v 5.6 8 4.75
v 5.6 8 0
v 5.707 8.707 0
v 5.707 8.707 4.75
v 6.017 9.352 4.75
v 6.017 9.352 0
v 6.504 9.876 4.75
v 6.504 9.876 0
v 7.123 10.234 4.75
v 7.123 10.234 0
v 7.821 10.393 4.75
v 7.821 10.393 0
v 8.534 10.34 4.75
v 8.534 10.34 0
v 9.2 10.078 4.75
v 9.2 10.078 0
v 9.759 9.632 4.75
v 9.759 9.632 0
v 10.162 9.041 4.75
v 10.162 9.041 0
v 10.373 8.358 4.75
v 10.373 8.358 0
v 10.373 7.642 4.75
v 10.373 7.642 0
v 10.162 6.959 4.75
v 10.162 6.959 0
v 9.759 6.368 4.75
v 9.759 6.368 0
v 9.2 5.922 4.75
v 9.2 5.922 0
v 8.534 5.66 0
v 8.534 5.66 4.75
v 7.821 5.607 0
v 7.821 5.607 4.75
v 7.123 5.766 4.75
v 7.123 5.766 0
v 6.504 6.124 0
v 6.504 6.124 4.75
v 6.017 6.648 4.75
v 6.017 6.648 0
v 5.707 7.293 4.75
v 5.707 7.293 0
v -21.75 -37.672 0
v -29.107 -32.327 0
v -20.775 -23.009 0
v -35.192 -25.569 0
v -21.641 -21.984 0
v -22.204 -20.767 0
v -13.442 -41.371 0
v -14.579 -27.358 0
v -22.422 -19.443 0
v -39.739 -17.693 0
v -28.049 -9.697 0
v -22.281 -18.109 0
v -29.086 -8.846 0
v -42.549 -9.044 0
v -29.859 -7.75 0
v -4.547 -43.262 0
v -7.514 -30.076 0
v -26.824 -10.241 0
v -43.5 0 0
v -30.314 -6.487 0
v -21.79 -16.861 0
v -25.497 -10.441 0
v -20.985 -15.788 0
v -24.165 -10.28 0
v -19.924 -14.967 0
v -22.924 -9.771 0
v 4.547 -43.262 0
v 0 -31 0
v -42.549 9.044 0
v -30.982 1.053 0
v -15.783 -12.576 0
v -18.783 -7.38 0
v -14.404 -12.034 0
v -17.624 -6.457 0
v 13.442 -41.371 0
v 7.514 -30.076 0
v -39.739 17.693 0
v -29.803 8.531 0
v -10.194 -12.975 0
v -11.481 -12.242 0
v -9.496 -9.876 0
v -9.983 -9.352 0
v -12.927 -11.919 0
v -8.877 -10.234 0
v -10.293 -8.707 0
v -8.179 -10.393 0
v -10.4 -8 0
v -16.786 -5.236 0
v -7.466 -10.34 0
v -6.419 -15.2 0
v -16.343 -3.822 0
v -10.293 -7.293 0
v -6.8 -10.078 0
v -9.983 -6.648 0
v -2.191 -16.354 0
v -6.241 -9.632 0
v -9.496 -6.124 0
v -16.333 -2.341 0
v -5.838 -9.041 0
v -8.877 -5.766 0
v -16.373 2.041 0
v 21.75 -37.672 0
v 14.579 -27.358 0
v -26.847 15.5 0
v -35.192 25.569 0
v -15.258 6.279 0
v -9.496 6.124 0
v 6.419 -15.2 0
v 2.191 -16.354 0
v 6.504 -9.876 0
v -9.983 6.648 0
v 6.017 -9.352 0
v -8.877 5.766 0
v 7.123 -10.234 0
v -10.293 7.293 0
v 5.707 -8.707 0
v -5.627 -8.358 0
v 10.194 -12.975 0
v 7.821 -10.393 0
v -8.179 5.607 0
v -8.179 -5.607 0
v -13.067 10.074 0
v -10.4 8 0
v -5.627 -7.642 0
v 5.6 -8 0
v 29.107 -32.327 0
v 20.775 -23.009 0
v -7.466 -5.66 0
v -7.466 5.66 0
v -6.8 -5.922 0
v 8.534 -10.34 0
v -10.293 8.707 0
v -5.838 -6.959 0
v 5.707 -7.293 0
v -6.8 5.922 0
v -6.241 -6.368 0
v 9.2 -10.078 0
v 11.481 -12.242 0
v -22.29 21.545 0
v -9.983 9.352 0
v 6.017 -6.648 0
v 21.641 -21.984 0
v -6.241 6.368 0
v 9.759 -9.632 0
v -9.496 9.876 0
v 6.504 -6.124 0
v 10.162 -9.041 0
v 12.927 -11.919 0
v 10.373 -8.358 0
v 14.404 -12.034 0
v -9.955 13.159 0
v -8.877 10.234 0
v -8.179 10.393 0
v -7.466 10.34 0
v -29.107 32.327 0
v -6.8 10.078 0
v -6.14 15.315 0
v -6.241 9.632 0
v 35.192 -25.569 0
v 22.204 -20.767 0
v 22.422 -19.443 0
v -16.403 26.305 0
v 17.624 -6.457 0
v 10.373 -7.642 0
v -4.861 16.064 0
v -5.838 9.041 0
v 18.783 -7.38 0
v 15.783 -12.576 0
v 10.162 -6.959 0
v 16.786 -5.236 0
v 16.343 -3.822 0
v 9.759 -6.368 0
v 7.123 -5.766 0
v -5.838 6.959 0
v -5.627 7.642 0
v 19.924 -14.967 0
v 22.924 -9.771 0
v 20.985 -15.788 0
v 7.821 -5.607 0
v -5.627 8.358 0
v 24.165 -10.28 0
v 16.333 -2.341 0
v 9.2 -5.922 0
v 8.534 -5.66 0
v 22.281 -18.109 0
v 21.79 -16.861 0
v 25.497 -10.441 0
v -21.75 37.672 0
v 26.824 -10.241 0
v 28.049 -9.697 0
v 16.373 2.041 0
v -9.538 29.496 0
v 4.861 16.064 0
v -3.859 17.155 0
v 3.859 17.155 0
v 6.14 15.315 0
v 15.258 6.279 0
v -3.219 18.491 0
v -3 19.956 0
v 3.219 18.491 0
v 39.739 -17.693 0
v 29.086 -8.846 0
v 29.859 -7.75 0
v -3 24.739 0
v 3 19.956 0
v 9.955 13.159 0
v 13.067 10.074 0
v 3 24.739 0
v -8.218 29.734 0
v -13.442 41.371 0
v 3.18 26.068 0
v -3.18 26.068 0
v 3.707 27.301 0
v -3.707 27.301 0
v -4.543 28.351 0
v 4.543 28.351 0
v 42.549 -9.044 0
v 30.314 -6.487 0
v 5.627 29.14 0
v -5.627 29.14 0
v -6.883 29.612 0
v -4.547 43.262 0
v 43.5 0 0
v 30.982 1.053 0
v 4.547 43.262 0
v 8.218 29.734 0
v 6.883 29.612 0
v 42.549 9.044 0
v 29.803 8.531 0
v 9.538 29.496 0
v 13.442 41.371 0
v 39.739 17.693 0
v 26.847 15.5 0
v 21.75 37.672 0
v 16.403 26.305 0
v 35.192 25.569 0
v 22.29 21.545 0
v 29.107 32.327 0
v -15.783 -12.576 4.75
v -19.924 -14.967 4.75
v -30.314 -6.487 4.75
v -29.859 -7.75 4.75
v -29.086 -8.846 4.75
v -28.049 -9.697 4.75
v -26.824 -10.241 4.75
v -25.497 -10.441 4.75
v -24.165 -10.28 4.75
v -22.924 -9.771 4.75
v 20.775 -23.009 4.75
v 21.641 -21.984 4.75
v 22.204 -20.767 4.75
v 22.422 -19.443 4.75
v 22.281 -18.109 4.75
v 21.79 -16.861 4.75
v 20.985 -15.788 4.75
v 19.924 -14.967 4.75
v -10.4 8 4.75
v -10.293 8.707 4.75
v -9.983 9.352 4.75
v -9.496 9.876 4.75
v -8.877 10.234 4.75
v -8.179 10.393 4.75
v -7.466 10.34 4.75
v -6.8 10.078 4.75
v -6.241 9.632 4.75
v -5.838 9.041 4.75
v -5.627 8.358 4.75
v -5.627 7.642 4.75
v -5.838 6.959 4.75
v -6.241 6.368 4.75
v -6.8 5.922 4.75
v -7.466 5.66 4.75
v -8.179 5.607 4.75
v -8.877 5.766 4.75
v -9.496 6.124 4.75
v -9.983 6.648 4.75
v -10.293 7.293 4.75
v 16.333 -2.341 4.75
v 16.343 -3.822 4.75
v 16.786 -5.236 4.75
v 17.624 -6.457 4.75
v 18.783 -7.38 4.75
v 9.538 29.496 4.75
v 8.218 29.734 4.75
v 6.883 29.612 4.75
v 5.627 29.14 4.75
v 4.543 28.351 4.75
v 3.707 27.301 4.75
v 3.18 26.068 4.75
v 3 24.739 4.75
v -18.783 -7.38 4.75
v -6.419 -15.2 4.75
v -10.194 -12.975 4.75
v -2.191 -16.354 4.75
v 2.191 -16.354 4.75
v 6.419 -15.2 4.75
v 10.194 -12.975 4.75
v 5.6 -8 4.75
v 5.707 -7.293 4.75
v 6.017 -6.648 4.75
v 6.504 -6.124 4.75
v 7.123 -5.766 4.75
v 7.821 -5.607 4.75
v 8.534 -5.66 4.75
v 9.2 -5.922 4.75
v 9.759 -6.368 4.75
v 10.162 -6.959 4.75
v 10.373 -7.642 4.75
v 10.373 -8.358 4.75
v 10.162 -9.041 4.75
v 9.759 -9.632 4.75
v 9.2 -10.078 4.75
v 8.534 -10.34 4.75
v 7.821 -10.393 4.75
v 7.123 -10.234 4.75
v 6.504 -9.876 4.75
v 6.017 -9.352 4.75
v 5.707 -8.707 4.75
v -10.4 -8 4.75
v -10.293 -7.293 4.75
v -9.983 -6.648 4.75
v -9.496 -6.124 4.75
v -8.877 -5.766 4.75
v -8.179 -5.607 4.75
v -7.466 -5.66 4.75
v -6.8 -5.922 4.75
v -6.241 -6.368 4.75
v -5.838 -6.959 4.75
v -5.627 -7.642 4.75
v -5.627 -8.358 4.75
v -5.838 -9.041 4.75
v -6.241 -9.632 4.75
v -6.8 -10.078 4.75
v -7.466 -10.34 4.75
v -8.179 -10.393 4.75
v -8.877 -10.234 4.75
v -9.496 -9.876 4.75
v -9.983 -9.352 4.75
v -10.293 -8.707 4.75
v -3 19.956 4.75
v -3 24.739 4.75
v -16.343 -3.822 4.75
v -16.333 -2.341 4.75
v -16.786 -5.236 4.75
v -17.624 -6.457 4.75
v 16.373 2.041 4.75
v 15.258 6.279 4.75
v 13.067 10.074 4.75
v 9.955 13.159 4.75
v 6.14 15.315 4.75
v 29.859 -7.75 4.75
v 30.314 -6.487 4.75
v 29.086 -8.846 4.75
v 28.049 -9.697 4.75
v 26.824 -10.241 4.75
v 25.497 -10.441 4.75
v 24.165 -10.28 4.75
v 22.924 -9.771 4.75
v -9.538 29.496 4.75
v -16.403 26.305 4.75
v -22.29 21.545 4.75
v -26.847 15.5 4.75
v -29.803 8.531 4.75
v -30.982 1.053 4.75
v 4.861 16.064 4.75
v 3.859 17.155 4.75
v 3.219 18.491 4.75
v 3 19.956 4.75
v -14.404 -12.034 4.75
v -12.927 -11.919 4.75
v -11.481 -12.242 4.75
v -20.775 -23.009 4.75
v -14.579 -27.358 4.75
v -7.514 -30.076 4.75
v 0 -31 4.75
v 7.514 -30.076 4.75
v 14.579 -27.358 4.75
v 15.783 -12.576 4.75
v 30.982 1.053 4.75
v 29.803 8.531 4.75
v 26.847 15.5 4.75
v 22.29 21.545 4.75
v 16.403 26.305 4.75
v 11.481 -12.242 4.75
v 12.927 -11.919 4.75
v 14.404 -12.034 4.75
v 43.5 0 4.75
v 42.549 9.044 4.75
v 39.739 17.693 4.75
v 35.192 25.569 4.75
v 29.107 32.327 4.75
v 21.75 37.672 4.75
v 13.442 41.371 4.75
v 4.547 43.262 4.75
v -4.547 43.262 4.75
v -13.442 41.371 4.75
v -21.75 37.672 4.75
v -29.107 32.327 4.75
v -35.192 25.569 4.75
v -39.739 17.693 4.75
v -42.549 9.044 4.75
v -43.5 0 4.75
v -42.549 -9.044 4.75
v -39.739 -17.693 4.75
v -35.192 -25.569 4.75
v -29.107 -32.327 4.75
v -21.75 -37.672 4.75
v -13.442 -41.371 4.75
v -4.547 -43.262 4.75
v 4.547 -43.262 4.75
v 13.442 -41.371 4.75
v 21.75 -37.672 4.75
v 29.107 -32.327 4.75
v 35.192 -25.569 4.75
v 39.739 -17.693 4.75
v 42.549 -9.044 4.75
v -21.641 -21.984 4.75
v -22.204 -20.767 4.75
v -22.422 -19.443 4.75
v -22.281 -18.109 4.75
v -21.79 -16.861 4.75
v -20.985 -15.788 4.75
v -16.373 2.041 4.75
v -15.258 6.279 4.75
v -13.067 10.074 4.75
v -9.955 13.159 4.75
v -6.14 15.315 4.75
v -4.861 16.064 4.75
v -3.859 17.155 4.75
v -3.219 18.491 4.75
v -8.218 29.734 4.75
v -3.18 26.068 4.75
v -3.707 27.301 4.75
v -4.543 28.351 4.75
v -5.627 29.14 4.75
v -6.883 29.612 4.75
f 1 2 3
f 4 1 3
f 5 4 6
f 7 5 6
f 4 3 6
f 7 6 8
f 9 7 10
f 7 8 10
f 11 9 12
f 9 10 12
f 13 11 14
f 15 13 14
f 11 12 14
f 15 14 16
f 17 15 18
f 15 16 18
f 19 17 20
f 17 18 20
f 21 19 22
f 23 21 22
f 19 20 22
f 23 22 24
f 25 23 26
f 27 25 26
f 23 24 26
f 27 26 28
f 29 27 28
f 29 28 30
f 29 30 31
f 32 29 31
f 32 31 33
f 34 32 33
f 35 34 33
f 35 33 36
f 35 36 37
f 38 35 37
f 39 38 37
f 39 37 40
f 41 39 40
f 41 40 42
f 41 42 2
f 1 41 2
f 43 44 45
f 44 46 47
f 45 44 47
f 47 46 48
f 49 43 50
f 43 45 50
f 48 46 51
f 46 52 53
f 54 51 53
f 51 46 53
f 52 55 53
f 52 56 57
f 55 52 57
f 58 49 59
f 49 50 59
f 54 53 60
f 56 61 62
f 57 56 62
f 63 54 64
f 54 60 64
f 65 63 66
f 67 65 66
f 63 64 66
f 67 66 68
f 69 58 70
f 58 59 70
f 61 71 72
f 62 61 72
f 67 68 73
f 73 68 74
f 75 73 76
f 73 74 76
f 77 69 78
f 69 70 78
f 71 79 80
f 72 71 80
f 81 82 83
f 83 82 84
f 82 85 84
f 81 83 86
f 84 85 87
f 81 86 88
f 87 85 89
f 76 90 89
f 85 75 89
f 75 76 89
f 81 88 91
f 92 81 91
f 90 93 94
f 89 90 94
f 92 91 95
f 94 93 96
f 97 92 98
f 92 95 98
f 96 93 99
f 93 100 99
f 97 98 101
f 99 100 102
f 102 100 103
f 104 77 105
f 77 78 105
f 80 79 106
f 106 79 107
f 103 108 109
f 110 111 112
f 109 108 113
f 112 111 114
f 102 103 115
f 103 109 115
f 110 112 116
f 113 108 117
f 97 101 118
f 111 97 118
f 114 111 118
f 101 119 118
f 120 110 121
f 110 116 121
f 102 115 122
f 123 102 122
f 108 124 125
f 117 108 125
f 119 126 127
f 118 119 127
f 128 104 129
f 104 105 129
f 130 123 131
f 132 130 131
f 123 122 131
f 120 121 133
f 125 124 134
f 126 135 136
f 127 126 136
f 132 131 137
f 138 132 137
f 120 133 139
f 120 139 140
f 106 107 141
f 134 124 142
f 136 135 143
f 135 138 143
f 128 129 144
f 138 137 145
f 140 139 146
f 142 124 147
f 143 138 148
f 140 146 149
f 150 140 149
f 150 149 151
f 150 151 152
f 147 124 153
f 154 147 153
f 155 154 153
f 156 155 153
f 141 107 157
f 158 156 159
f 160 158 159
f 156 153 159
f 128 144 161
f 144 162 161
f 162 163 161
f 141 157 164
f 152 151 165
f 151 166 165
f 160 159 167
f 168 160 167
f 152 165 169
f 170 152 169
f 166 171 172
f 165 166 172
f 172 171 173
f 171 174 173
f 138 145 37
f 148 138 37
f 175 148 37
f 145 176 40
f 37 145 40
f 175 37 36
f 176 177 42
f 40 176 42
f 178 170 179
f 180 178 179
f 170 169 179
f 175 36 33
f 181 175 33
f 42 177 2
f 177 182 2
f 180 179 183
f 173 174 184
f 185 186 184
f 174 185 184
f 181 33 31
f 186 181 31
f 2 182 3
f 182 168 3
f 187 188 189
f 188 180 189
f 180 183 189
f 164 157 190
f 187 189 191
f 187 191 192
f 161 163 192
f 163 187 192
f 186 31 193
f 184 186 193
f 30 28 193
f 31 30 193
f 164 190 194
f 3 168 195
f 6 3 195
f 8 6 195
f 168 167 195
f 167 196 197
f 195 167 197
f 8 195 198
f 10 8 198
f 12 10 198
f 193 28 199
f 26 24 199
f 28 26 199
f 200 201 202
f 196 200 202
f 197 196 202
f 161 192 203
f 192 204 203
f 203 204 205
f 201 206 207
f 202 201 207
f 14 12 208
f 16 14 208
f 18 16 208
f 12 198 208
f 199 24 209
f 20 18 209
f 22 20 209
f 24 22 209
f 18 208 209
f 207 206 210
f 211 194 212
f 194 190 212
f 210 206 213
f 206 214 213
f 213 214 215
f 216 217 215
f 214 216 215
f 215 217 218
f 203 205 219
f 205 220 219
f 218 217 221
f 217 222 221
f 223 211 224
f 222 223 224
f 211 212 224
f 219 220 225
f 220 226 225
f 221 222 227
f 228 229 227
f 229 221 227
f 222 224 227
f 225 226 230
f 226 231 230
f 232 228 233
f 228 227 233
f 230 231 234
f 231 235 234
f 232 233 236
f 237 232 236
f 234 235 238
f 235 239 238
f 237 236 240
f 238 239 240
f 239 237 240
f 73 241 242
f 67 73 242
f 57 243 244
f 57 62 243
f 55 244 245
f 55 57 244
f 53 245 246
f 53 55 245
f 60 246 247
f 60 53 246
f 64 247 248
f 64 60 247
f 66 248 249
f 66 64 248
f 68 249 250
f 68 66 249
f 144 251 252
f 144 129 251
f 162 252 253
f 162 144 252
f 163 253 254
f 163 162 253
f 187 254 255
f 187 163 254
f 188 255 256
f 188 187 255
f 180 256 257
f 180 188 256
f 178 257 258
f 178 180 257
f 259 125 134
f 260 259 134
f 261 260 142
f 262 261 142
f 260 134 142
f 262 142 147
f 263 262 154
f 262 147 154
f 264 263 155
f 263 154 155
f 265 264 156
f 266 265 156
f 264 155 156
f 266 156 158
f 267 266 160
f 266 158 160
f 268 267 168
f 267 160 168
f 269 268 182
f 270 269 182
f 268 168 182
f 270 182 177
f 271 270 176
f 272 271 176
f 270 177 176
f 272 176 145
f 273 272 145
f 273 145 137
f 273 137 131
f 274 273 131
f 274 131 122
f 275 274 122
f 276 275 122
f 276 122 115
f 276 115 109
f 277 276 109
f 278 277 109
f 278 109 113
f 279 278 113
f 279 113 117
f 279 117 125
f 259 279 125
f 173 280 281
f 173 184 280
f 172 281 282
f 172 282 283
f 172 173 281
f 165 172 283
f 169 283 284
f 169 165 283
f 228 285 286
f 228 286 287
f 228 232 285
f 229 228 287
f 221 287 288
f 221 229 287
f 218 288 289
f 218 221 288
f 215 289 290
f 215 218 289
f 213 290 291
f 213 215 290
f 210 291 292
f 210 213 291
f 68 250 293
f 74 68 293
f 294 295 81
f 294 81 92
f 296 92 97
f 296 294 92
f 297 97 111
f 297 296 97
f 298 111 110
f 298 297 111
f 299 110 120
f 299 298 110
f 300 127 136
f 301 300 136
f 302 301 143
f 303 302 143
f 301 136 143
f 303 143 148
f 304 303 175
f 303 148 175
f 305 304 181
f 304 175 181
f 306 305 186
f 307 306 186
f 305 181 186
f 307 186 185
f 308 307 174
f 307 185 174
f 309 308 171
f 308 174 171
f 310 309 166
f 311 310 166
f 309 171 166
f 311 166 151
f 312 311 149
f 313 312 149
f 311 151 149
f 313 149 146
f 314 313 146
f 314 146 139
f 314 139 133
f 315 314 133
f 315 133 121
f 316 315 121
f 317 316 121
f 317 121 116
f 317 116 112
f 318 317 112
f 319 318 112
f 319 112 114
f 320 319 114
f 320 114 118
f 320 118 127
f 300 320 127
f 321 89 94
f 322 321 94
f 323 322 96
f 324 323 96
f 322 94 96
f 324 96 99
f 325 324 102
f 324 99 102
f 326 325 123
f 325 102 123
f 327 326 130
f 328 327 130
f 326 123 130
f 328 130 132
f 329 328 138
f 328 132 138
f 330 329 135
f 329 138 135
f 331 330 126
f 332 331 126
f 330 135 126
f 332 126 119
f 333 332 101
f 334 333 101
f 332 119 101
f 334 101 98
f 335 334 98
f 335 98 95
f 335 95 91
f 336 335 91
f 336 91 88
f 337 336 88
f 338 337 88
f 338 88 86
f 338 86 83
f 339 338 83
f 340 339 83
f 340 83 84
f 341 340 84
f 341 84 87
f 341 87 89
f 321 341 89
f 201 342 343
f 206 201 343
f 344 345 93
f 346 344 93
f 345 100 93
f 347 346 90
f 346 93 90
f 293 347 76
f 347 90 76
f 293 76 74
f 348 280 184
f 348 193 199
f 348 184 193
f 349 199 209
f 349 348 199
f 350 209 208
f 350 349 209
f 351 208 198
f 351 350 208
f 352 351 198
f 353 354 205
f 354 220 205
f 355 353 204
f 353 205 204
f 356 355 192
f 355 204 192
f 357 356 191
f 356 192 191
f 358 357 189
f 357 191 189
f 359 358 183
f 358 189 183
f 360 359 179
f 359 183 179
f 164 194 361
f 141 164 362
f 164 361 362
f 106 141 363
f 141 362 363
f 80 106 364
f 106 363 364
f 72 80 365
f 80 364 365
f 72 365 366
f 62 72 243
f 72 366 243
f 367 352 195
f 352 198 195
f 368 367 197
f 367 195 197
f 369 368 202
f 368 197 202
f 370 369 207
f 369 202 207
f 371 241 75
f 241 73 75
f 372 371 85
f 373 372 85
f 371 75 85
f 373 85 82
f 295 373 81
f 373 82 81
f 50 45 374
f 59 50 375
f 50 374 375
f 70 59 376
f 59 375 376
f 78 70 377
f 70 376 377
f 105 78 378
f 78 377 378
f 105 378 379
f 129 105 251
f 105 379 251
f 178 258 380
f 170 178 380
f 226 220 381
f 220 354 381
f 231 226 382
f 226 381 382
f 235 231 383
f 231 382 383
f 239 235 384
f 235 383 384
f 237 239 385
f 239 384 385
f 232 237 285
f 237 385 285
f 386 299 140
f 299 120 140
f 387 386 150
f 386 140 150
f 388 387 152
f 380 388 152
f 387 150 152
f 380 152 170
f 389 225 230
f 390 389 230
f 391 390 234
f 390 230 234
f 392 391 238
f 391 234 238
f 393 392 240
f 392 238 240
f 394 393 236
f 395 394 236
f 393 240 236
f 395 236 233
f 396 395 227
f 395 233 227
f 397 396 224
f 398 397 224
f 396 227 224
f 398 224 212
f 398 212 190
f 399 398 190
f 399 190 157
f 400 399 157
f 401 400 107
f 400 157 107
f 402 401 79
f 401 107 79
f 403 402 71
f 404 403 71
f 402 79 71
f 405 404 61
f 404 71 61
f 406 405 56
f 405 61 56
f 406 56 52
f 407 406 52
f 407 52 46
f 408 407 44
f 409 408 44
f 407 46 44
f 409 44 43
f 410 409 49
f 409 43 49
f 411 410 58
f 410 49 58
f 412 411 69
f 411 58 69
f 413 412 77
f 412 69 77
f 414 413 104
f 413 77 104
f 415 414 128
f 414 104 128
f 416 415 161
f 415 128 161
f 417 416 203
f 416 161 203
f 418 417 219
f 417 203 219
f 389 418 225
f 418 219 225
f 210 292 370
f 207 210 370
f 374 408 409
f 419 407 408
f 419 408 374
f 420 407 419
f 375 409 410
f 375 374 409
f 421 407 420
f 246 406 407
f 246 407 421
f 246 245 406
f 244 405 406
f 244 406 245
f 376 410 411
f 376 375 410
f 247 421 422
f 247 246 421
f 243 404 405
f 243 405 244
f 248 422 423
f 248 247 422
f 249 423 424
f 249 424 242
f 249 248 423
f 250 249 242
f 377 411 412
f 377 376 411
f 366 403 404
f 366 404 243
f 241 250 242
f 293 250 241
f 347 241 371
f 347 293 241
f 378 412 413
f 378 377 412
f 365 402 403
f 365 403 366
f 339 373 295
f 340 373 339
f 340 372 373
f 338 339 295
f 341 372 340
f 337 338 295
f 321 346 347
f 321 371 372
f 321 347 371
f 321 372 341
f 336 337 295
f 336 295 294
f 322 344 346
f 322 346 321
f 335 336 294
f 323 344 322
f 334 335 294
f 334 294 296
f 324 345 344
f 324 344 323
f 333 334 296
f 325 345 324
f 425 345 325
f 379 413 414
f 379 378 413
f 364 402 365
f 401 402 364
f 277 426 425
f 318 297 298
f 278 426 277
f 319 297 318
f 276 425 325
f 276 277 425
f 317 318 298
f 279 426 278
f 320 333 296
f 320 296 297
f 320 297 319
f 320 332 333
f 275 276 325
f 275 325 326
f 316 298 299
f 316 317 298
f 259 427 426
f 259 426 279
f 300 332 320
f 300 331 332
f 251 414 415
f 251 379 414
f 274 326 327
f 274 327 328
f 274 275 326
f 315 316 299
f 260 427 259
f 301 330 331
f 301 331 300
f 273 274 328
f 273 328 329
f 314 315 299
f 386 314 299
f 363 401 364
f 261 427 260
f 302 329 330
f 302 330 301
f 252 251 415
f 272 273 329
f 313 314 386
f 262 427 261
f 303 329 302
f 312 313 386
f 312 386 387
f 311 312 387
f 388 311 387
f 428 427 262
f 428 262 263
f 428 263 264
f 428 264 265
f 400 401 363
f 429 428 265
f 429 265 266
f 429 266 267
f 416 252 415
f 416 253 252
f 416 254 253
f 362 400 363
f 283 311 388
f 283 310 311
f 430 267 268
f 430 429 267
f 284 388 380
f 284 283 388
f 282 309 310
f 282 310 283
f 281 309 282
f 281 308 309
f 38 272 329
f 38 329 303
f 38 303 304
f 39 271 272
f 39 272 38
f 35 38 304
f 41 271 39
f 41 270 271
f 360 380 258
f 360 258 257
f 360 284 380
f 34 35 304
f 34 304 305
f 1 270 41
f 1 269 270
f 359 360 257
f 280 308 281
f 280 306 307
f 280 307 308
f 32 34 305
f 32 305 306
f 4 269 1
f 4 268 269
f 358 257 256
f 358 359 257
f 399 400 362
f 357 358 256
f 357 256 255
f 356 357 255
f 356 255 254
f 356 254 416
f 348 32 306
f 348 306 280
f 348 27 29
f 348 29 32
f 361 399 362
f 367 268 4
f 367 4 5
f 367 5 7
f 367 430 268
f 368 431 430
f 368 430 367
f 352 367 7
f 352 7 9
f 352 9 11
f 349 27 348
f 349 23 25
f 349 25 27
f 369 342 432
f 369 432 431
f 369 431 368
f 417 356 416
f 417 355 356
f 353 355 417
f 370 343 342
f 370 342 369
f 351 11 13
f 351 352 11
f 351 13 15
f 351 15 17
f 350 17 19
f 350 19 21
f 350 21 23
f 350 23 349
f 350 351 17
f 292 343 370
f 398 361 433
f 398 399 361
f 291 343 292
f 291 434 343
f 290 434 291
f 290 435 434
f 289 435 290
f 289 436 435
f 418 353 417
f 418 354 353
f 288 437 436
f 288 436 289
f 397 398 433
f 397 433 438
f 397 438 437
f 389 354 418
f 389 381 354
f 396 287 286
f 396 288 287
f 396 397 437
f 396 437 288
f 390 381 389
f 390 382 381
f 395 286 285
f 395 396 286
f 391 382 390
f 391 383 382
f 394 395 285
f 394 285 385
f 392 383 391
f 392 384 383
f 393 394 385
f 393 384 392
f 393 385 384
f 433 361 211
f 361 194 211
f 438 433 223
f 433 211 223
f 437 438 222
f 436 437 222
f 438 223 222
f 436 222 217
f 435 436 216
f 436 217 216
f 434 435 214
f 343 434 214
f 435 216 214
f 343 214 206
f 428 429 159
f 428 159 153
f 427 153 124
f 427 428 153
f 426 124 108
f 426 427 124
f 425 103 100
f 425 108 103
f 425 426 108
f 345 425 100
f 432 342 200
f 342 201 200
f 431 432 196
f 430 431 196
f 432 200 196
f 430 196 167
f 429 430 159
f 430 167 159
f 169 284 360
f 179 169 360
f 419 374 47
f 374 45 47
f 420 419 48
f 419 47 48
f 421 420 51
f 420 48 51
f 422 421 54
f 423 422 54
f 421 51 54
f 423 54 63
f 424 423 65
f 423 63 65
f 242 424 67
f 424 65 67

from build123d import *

# Parameters (mm, degrees)
SKETCH1_R            = 43.5
BOSS_EXTRUDE1_DEPTH  = 4.7498
SKETCH2_R            = 31
SKETCH2_R_2          = 16.5
CUT_EXTRUDE1_DEPTH   = 21.73
BOSS_EXTRUDE2_DEPTH  = 4.7498
CIRPATTERN1_COUNT    = 3
FILLET1_R            = 5
M4_CLEARANCE_HOLE1_D = 4.8


with BuildPart() as part:
    # Sketch1 → Boss-Extrude1 (new body)
    with BuildSketch(Plane.XY):
        Circle(SKETCH1_R)
    extrude(amount=BOSS_EXTRUDE1_DEPTH)

    # Sketch2 → Cut-Extrude1 (cut)
    with BuildSketch(Plane.XY.offset(4.7498)):
        Circle(SKETCH2_R)
        Circle(SKETCH2_R_2, mode=Mode.SUBTRACT)
    extrude(amount=-CUT_EXTRUDE1_DEPTH, mode=Mode.SUBTRACT)

    # Sketch3 → Boss-Extrude2 (add)
    with BuildSketch(Plane.XY.offset(4.7498)):
        with BuildLine():
            Line((-3, 16.22498074), (-3, 30.854497241))
            ThreePointArc((-3, 30.854497241), (0, 31), (3, 30.854497241))
            Line((3, 30.854497241), (3, 16.22498074))
            ThreePointArc((3, 16.22498074), (0, 16.5), (-3, 16.22498074))
        make_face()
    boss_extrude2 = extrude(amount=-BOSS_EXTRUDE2_DEPTH)

    # CirPattern1: Boss-Extrude2 ×3 about axis
    cirpattern1_axis = Axis((0, 0, 0), (0, 0, 1))
    for i in range(1, CIRPATTERN1_COUNT):
        add(boss_extrude2.rotate(cirpattern1_axis, i * 360 / CIRPATTERN1_COUNT))

    # Fillet1
    fillet1_edges = [part.edges().sort_by_distance(p)[0] for p in [
        (-15.551245496, -5.514414158, 2.3749),
        (-12.551245496, -10.710566581, 2.3749),
        (-25.220778432, -18.025324832, 2.3749),
        (-28.220778432, -12.829172409, 2.3749),
        (12.551245496, -10.710566581, 2.3749),
        (15.551245496, -5.514414158, 2.3749),
        (28.220778432, -12.829172409, 2.3749),
        (25.220778432, -18.025324832, 2.3749),
        (3, 16.22498074, 2.3749),
        (-3, 16.22498074, 2.3749),
        (-3, 30.854497241, 2.3749),
        (3, 30.854497241, 2.3749),
    ]]
    fillet(fillet1_edges, radius=FILLET1_R)

    # M4 Clearance Hole1 (through all)
    with Locations(Plane.XY.offset(4.7498)):
        with Locations((-8, 8), (-8, -8), (8, -8), (8, 8)):
            Hole(M4_CLEARANCE_HOLE1_D / 2)


solid = part.part
